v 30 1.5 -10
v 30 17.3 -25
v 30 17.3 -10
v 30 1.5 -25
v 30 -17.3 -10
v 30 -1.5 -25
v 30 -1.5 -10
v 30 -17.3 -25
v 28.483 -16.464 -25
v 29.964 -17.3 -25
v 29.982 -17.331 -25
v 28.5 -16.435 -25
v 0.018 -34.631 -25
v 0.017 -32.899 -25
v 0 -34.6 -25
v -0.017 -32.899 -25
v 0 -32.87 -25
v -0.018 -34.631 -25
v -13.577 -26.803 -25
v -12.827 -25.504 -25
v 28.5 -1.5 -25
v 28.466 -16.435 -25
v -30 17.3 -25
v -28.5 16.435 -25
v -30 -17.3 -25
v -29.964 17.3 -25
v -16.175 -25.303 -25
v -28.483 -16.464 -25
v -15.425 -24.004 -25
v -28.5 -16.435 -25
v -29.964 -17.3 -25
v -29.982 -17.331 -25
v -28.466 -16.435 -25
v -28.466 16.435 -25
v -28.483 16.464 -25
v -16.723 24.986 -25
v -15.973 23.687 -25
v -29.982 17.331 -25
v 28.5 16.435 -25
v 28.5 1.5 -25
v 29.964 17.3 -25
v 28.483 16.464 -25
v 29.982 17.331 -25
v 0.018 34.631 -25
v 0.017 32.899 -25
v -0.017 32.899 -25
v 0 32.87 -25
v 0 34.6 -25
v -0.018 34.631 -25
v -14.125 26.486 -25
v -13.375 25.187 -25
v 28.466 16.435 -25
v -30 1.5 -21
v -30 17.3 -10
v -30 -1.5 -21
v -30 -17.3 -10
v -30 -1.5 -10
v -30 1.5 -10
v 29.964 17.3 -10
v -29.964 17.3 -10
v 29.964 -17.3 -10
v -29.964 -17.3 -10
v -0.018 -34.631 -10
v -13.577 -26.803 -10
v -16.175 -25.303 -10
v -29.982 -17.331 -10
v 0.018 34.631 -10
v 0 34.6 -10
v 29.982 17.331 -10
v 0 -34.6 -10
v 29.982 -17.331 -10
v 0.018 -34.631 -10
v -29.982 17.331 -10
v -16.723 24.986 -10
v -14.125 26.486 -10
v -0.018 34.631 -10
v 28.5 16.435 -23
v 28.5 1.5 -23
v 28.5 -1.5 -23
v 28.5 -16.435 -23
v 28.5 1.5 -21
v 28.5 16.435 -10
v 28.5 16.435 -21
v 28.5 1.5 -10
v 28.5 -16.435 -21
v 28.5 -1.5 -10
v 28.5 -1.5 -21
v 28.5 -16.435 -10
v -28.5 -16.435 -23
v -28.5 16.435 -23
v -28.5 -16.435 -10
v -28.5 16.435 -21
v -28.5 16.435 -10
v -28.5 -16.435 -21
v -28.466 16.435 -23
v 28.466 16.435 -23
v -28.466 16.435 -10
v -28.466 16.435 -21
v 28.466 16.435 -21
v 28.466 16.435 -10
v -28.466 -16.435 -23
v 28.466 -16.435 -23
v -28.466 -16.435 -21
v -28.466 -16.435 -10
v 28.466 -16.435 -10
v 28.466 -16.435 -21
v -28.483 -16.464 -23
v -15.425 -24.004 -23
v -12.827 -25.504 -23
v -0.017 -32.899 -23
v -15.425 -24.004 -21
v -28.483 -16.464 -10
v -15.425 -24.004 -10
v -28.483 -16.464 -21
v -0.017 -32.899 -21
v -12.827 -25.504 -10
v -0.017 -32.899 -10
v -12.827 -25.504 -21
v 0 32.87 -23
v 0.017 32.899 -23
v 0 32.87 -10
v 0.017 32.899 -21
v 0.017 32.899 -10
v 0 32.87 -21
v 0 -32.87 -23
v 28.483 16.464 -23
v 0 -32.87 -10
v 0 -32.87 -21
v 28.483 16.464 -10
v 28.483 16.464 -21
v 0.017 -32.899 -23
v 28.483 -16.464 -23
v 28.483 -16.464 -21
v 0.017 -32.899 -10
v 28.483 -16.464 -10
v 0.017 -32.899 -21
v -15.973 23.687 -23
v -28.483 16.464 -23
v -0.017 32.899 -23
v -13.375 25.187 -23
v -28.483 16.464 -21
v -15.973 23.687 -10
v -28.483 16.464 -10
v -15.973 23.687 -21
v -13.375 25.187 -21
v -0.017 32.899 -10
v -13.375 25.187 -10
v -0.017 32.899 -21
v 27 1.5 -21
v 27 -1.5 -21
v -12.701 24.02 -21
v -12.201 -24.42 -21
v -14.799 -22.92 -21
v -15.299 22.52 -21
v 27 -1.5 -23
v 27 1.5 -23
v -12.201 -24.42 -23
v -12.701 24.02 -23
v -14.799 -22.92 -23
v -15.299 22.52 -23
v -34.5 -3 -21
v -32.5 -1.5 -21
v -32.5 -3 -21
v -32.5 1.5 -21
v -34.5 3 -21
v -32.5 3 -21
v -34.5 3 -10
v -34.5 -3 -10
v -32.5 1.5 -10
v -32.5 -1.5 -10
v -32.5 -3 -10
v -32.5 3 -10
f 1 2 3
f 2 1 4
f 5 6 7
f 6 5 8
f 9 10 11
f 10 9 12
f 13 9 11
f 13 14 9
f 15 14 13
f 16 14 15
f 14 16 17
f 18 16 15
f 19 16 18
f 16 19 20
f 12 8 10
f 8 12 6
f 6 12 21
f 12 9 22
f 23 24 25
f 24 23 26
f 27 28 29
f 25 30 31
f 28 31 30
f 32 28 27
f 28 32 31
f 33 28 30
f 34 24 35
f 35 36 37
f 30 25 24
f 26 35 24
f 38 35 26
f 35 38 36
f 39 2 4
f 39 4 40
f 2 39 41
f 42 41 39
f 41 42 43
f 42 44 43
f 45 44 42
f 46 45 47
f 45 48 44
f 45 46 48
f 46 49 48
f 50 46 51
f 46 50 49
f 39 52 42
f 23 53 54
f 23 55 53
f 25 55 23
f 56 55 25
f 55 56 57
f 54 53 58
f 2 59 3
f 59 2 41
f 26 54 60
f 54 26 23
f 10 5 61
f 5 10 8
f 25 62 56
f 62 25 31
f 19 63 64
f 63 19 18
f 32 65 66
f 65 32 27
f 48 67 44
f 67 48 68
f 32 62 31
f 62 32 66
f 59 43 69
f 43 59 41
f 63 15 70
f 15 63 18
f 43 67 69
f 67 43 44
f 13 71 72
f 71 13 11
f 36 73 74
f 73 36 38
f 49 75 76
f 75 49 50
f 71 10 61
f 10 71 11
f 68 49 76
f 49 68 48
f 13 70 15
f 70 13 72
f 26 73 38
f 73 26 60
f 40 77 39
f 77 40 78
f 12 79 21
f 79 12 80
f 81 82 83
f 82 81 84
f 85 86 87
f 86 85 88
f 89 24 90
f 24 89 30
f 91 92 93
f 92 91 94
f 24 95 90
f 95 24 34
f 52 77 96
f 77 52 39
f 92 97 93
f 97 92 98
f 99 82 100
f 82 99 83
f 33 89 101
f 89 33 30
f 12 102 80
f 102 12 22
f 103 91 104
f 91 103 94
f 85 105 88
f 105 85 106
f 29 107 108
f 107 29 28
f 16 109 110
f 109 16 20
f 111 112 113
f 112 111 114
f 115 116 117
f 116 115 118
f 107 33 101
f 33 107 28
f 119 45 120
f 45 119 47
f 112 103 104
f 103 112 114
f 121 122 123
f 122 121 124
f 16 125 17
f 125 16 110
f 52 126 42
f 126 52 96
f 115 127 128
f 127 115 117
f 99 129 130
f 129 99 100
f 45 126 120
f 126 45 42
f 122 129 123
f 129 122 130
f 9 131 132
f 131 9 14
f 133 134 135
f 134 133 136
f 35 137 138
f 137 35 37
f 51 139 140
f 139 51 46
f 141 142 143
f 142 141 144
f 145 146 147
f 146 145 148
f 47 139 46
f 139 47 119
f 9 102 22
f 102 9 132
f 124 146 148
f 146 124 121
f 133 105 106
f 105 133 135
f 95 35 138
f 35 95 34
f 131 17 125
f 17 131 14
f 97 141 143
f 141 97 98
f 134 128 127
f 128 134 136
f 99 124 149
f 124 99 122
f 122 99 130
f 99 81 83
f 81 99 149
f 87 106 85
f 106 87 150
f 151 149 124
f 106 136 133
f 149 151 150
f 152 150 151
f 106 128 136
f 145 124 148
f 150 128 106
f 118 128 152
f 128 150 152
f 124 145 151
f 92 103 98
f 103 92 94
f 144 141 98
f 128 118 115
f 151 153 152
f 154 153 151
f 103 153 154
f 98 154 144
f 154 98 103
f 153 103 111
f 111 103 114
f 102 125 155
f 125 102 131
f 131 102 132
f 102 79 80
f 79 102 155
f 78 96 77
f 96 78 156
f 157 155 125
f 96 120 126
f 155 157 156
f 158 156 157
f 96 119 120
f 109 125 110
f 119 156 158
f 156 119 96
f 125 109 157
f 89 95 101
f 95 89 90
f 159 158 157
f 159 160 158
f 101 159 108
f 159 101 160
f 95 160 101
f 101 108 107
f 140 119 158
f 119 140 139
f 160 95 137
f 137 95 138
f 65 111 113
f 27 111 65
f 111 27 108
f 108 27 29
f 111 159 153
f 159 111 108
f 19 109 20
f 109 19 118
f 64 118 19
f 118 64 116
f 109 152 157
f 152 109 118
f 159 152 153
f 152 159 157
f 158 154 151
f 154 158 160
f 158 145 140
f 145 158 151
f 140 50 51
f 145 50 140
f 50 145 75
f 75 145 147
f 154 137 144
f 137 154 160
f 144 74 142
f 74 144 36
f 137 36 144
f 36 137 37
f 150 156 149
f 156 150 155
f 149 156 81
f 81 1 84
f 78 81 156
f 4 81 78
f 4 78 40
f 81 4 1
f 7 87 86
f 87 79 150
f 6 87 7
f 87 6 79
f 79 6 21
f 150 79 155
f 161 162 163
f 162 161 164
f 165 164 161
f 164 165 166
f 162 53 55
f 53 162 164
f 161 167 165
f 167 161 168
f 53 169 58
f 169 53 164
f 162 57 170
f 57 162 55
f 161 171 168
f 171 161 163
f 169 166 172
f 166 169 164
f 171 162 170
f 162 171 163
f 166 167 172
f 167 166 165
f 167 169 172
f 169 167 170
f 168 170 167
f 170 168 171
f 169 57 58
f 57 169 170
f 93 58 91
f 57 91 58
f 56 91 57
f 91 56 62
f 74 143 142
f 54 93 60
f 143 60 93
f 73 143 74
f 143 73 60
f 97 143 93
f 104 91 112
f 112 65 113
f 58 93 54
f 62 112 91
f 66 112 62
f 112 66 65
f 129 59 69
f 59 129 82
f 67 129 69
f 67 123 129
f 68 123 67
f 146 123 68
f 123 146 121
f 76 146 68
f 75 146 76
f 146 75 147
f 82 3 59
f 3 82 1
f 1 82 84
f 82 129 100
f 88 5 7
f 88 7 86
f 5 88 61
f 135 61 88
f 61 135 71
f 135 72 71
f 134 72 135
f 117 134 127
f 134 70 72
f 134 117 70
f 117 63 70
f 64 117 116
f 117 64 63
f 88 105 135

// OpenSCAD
// short pen_holder

x = 60;
y = 34.6;
z = 50;

module hexagon()
{
	difference() {
		union() {
			cube([x,y,z], center=true);
			rotate([0,0,60]) cube([x,y,z], center=true);
			rotate([0,0,-60]) cube([x,y,z], center=true);
		}
		union() {
			cube([x*0.95,y*0.95,z*2], center=true);
			rotate([0,0,60]) cube([x*0.95,y*0.95,z*2], center=true);
			rotate([0,0,-60]) cube([x*0.95,y*0.95,z*2], center=true);
		}
	}

}

difference() {
	union() {
			difference() {
				union() {
					hexagon();
					translate([0,0,-22])
						union() {
							cube([x,y,2], center=true);
							rotate([0,0,60]) cube([x,y,2], center=true);
							rotate([0,0,-60]) cube([x,y,2], center=true);
						}
					}
				union() {
					translate([-16,-28,0]) rotate([0,0,60]) cube([10,3,200], center=true);		
					//translate([-32,0,0]) rotate([0,0,0]) cube([10,3,100], center=true);
					translate([-16.5,27.6,0]) rotate([0,0,-60]) cube([10,3,200], center=true);
					//translate([16,28,0]) rotate([0,0,60]) cube([10,3,100], center=true);
					translate([32,0,0]) rotate([0,0,0]) cube([10,3,200], center=true);
					//translate([16.5,-27.6,0]) rotate([0,0,-60]) cube([10,3,100], center=true);
			
			
				}
			}
					translate([-32,0,0]) rotate([0,0,0]) cube([5,3,42], center=true);
					translate([-33.5,0,0]) rotate([0,0,90]) cube([6,2,42], center=true);
		}

		translate([-40,-40,-10]) cube([80,80,50]);
}








	
